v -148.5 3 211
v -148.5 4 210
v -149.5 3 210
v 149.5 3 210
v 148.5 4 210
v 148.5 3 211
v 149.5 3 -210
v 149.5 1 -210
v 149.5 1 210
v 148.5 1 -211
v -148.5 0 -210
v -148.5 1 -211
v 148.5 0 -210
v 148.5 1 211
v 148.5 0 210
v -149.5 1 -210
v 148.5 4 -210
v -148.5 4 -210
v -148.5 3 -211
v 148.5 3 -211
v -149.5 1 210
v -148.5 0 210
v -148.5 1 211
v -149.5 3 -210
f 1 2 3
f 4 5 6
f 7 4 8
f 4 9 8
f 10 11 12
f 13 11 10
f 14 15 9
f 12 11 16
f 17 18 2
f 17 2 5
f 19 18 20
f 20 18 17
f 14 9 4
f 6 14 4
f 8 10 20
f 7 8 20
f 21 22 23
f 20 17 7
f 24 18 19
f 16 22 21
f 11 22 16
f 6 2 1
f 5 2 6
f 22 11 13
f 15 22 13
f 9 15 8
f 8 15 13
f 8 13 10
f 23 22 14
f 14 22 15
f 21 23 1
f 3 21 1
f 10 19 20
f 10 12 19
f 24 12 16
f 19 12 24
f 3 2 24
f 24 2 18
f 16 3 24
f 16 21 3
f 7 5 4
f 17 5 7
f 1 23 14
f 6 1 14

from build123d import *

# Parameters (mm, degrees)
CROQUIS1_W              = 299
CROQUIS1_H              = 422
SALIENTE_EXTRUIR1_DEPTH = 4
CHAFL_N1_SIZE           = 1


with BuildPart() as part:
    # Croquis1 → Saliente-Extruir1 (new body)
    with BuildSketch(Plane(origin=(0, 0, 0), x_dir=(1, 0, 0), z_dir=(0, 1, 0))):
        Rectangle(CROQUIS1_W, CROQUIS1_H)
    extrude(amount=SALIENTE_EXTRUIR1_DEPTH)

    # Chaflán1
    chafl_n1_edges = [part.edges().sort_by_distance(p)[0] for p in [
        (149.5, 4, 0),
        (0, 4, -211),
        (-149.5, 4, 0),
        (0, 0, -211),
        (149.5, 0, 0),
        (0, 0, 211),
        (-149.5, 0, 0),
        (0, 4, 211),
        (-149.5, 2, -211),
        (149.5, 2, -211),
        (149.5, 2, 211),
        (-149.5, 2, 211),
    ]]
    chamfer(chafl_n1_edges, length=CHAFL_N1_SIZE)


solid = part.part
